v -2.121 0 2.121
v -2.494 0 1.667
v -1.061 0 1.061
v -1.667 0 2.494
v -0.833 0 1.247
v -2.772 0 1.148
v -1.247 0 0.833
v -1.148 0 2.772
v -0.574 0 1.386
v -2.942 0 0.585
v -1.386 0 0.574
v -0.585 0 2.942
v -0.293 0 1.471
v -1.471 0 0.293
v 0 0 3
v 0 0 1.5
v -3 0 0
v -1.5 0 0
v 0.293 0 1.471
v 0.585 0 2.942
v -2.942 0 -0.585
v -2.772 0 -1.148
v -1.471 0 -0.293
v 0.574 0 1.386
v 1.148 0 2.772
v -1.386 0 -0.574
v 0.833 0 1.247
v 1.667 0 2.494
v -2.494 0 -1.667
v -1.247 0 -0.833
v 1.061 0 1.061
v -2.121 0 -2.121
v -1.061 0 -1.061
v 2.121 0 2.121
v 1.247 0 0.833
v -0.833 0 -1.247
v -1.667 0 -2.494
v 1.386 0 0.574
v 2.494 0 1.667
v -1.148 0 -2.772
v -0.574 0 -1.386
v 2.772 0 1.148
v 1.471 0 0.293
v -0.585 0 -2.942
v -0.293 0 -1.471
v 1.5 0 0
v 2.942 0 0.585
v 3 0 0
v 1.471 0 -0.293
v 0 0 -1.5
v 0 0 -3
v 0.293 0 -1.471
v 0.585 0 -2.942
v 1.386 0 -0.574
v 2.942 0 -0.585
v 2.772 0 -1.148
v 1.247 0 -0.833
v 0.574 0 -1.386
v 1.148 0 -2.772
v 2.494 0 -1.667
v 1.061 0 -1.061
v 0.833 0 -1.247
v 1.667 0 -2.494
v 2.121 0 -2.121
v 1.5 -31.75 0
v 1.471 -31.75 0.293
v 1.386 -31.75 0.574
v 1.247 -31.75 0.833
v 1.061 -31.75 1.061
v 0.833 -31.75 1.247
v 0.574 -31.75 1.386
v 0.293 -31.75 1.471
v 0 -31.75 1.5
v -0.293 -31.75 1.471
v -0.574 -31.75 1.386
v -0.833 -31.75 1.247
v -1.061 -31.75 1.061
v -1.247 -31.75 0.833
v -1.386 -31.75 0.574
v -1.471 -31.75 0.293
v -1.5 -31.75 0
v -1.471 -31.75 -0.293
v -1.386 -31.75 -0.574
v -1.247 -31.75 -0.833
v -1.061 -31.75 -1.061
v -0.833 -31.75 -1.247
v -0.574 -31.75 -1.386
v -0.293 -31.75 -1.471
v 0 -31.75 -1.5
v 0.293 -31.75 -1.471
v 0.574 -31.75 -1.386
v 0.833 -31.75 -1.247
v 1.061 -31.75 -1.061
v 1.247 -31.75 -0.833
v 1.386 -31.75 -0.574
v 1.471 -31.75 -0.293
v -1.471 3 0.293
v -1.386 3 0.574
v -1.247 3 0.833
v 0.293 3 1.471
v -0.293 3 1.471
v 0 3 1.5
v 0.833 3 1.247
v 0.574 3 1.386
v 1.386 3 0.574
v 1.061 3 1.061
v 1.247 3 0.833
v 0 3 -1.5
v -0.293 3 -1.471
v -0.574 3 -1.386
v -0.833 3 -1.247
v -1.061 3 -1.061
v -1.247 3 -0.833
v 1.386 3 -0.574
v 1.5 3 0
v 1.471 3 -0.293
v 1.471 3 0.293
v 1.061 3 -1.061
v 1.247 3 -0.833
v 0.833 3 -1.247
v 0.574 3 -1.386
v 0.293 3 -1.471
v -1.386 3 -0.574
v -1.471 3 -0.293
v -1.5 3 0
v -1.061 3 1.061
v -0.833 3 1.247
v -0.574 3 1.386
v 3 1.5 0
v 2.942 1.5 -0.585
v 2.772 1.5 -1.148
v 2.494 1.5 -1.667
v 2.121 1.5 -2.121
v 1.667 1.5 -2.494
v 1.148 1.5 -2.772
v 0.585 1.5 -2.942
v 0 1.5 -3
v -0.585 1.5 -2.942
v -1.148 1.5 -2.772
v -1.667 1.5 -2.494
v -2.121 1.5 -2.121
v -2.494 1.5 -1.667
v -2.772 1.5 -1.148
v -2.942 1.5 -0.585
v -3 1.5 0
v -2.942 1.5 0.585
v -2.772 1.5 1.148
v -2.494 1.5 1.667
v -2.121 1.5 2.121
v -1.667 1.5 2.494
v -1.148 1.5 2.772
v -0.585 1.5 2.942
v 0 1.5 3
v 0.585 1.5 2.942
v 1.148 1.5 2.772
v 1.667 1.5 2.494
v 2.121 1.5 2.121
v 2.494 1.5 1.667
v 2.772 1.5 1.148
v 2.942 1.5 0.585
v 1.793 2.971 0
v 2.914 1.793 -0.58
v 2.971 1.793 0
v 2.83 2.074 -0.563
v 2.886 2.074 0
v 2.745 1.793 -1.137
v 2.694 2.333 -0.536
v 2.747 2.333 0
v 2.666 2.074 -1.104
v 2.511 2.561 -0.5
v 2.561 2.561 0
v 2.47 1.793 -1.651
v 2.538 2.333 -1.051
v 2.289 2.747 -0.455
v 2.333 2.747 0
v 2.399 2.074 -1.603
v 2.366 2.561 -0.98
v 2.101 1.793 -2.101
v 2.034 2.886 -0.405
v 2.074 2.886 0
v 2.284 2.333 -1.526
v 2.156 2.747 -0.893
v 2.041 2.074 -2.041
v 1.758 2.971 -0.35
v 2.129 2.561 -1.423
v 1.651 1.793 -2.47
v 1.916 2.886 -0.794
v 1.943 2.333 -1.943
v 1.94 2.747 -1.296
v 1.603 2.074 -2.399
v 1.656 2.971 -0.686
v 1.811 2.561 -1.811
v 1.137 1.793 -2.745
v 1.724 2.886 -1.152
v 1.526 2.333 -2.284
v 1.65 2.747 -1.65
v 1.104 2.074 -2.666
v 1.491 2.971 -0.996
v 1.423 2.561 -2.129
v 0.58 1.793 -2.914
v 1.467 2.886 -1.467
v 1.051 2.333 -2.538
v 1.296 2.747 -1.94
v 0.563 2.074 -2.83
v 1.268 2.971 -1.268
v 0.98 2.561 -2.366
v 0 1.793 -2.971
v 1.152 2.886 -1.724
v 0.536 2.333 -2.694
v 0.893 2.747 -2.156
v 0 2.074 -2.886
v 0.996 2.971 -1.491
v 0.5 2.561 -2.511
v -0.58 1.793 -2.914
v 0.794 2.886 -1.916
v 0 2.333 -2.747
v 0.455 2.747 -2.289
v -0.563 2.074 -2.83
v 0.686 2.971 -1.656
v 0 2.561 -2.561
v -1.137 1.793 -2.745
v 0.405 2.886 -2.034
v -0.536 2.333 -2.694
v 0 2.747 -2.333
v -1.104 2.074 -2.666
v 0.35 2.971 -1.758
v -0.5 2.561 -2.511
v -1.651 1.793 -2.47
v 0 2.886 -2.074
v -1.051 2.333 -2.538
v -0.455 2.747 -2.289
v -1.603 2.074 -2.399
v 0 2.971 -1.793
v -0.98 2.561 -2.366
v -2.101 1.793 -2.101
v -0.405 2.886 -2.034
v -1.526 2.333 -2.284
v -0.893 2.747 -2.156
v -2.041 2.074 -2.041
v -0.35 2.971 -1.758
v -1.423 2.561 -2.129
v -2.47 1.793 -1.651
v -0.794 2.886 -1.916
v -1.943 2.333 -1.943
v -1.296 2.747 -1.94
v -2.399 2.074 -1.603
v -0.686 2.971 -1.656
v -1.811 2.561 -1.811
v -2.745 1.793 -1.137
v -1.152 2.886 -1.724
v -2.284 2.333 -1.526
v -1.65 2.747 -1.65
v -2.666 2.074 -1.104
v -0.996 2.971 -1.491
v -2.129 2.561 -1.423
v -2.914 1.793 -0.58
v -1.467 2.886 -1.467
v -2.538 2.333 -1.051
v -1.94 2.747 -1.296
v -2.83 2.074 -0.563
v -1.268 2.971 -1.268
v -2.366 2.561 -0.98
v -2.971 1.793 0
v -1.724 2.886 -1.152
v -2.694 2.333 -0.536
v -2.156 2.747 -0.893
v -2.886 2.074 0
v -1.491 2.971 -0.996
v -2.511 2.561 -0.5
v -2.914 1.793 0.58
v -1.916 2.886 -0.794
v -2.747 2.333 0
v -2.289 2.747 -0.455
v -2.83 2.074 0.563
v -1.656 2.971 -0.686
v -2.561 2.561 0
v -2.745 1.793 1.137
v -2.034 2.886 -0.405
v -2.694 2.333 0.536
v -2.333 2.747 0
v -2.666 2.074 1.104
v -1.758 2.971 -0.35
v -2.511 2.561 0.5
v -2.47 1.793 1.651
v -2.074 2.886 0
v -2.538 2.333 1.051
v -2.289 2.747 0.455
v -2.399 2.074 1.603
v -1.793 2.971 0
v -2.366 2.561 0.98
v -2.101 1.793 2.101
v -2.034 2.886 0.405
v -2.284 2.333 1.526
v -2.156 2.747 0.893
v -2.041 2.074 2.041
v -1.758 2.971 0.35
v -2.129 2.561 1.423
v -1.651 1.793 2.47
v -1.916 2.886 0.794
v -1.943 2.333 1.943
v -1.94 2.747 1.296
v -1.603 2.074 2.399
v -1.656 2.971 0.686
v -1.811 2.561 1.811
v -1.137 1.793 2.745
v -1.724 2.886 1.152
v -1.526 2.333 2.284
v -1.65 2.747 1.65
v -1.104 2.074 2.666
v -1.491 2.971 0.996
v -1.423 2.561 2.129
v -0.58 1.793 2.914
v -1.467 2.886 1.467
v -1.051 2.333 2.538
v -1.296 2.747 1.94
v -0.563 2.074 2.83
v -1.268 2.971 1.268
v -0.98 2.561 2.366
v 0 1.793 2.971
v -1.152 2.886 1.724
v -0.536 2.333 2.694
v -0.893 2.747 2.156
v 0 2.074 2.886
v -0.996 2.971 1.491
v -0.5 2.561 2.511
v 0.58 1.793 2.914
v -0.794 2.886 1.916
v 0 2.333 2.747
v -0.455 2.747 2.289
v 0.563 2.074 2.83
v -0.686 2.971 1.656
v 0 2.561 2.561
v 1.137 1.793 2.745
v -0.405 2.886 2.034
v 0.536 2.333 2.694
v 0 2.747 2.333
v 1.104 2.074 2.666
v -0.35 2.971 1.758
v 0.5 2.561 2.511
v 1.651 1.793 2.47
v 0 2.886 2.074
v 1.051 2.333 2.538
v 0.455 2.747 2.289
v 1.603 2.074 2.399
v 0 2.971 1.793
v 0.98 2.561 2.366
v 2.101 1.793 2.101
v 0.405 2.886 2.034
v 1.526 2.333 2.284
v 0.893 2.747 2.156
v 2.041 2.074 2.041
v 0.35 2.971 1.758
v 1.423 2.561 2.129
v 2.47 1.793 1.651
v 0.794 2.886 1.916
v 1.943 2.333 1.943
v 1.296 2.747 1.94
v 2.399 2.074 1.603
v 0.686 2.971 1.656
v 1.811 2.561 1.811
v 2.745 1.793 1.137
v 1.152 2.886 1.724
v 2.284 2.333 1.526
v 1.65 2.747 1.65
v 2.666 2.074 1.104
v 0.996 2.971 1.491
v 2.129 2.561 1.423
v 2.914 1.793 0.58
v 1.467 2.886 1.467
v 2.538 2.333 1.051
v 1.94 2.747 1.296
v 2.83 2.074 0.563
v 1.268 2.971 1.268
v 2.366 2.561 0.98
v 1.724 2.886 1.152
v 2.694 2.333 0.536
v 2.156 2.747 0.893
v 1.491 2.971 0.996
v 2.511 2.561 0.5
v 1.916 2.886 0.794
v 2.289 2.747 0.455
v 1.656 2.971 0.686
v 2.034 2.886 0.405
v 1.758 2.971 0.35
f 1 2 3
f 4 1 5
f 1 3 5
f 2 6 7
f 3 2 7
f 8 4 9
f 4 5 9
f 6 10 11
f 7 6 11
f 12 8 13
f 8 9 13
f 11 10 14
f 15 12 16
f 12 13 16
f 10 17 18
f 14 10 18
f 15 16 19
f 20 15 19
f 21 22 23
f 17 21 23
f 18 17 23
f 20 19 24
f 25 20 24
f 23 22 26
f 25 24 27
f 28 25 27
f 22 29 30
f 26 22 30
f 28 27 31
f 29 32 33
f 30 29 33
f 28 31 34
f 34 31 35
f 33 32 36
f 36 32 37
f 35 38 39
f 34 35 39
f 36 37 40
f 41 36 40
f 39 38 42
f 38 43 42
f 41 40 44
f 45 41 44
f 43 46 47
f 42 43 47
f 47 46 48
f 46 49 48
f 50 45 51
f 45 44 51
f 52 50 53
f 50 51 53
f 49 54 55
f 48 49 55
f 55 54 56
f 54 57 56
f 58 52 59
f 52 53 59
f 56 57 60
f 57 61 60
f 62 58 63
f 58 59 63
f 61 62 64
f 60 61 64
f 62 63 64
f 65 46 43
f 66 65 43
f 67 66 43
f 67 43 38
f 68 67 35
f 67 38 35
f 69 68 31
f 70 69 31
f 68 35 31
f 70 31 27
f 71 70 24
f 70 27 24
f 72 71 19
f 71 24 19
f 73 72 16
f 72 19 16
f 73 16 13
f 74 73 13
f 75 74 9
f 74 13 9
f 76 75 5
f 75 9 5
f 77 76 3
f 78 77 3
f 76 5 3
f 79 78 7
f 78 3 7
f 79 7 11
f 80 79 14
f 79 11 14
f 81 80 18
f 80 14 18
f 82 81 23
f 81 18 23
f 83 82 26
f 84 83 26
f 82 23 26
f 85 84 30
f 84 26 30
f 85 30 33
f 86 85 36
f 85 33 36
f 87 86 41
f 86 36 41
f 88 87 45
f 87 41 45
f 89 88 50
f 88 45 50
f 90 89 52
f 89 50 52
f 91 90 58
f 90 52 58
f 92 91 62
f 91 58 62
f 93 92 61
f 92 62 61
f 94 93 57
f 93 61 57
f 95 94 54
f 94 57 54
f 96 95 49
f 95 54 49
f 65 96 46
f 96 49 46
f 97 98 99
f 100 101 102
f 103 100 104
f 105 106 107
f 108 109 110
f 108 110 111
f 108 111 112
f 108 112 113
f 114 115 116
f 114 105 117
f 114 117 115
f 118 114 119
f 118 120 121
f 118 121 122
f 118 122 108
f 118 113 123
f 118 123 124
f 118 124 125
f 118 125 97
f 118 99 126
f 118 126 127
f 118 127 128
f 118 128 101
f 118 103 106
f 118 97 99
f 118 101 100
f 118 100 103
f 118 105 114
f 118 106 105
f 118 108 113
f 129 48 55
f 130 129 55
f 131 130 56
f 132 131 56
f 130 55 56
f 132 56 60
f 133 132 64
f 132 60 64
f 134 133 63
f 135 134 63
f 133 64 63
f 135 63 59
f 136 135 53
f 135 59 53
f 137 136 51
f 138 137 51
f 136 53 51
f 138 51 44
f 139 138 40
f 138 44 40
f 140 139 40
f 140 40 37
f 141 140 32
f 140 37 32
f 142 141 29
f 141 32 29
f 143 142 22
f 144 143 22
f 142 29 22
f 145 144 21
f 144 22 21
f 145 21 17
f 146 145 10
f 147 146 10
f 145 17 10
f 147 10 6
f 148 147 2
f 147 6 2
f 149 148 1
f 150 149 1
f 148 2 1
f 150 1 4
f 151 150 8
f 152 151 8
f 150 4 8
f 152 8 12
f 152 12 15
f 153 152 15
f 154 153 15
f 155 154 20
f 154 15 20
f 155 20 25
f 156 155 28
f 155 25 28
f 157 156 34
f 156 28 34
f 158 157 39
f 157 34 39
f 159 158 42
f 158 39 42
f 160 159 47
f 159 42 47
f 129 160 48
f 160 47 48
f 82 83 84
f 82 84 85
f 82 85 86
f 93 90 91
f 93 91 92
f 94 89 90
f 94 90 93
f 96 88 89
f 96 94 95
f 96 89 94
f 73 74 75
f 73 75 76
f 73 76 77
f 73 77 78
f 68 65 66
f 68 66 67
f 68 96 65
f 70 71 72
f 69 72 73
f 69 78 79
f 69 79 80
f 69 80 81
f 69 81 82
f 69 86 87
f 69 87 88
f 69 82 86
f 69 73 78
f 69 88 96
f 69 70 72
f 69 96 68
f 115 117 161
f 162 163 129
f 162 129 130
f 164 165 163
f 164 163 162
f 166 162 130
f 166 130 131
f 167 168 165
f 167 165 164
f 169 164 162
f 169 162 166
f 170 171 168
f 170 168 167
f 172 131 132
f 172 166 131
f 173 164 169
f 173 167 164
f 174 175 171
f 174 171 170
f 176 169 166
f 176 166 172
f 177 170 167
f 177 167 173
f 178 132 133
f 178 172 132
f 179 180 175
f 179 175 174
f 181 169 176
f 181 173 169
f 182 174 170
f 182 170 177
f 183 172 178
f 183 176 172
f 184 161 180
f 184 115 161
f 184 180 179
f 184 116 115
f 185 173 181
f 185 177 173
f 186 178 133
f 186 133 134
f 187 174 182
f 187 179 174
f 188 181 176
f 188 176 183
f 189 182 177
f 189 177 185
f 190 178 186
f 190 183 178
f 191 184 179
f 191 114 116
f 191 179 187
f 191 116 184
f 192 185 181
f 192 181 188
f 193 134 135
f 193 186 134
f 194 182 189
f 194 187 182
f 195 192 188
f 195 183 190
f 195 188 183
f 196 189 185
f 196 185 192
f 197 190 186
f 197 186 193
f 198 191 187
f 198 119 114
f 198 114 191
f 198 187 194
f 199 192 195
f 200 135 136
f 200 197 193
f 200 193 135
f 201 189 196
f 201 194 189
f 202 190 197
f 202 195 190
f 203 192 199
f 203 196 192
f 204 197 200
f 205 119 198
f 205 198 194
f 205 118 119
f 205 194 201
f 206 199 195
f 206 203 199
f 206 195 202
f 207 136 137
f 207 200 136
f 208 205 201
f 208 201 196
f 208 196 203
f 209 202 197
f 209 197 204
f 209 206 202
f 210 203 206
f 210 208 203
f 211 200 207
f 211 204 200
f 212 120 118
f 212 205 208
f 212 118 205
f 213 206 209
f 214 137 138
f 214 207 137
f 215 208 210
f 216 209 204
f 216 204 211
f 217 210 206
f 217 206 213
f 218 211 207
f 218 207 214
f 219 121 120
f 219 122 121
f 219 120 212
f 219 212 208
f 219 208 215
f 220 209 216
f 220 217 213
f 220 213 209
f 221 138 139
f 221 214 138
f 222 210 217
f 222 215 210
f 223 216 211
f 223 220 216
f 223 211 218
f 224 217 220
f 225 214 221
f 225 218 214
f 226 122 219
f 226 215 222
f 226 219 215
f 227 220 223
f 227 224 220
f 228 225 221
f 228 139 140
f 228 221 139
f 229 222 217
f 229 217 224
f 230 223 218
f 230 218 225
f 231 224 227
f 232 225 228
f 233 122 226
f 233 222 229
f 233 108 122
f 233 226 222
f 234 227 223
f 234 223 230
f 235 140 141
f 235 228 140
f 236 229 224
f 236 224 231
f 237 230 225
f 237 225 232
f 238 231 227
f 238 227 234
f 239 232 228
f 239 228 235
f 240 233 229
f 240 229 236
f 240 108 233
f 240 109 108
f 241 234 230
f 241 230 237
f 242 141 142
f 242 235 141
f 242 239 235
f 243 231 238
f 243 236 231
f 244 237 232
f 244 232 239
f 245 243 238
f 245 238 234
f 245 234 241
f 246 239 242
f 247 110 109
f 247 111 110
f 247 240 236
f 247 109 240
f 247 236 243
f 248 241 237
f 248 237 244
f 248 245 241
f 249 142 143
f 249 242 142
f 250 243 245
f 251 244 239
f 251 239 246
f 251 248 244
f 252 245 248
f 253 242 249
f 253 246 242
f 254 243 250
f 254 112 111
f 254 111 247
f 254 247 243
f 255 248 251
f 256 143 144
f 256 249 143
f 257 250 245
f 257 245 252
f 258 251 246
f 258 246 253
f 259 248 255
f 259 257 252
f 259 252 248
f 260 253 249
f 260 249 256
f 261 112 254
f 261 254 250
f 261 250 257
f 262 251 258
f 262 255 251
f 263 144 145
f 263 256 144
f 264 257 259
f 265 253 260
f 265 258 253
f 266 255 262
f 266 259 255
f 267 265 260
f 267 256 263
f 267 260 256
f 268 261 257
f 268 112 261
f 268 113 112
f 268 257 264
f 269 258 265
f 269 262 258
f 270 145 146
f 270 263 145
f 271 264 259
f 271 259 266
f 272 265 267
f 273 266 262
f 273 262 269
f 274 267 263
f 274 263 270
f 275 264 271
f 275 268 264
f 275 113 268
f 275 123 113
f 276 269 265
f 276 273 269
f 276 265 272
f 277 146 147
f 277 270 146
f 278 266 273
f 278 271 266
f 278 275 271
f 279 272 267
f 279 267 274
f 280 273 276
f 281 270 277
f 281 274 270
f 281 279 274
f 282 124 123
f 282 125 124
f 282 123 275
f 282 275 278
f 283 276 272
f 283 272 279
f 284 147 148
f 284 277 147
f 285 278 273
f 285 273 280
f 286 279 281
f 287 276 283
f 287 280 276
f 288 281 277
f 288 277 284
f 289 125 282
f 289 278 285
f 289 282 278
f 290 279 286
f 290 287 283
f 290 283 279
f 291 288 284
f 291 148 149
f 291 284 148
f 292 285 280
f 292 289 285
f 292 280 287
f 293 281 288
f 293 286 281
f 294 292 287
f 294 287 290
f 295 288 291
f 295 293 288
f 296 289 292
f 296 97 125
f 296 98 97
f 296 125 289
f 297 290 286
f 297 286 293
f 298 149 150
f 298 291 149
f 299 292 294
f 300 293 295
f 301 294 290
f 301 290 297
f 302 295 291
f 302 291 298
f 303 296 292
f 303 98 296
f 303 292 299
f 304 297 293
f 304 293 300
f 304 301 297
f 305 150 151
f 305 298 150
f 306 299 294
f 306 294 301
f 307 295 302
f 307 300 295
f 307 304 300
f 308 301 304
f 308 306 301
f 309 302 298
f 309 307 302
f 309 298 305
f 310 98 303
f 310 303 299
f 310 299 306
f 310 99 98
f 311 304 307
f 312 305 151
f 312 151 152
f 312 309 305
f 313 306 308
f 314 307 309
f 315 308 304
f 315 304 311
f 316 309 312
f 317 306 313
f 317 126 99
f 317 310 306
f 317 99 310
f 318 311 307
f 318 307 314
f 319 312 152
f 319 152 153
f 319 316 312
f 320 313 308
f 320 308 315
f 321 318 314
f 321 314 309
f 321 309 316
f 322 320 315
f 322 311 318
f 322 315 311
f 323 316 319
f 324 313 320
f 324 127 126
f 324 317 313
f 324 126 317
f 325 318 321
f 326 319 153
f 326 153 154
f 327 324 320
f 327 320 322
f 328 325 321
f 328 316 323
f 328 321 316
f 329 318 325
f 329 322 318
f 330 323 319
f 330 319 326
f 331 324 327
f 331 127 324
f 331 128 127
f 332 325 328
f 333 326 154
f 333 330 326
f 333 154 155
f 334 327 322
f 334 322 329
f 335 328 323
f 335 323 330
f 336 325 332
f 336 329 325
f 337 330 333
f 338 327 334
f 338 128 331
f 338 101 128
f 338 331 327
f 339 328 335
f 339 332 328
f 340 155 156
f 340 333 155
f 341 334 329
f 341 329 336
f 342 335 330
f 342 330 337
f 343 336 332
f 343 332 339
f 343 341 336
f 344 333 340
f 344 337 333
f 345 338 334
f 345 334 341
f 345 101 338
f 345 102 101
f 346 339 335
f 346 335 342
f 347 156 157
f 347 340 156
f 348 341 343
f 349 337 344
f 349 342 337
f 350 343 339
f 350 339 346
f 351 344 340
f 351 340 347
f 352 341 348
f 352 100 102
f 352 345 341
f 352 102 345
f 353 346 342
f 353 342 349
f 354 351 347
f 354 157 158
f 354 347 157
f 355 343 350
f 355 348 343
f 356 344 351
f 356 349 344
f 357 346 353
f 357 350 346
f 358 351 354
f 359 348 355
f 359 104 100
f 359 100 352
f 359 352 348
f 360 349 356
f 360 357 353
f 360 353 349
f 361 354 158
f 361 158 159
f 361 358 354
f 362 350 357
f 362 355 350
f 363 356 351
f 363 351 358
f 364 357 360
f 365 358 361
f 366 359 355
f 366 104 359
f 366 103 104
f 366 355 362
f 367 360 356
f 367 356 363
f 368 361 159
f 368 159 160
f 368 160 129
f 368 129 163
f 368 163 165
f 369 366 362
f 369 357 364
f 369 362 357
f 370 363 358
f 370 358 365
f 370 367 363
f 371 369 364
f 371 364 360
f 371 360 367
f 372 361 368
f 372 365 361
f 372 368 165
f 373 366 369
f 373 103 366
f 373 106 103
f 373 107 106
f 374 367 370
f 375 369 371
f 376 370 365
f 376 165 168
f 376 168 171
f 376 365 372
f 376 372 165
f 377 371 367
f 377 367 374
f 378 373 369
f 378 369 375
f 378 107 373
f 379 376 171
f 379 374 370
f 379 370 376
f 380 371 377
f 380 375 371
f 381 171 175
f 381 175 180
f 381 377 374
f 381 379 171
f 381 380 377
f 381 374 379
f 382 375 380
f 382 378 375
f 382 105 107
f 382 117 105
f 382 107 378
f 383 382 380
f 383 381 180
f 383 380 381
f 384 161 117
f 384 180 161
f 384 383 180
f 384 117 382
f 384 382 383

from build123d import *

# Parameters (mm, degrees)
SKETCH1_R           = 3
BOSS_EXTRUDE1_DEPTH = 3
FILLET1_R           = 1.5
SKETCH2_R           = 1.5
BOSS_EXTRUDE2_DEPTH = 31.75


with BuildPart() as part:
    # Sketch1 → Boss-Extrude1 (new body)
    with BuildSketch(Plane(origin=(0, 0, 0), x_dir=(1, 0, 0), z_dir=(0, 1, 0))):
        Circle(SKETCH1_R)
    extrude(amount=BOSS_EXTRUDE1_DEPTH)

    # Fillet1
    fillet1_edges = [part.edges().sort_by_distance(p)[0] for p in [
        (-3, 3, 0),
    ]]
    fillet(fillet1_edges, radius=FILLET1_R)

    # Sketch2 → Boss-Extrude2 (add)
    with BuildSketch(Plane.XZ):
        Circle(SKETCH2_R)
    extrude(amount=BOSS_EXTRUDE2_DEPTH)


solid = part.part
